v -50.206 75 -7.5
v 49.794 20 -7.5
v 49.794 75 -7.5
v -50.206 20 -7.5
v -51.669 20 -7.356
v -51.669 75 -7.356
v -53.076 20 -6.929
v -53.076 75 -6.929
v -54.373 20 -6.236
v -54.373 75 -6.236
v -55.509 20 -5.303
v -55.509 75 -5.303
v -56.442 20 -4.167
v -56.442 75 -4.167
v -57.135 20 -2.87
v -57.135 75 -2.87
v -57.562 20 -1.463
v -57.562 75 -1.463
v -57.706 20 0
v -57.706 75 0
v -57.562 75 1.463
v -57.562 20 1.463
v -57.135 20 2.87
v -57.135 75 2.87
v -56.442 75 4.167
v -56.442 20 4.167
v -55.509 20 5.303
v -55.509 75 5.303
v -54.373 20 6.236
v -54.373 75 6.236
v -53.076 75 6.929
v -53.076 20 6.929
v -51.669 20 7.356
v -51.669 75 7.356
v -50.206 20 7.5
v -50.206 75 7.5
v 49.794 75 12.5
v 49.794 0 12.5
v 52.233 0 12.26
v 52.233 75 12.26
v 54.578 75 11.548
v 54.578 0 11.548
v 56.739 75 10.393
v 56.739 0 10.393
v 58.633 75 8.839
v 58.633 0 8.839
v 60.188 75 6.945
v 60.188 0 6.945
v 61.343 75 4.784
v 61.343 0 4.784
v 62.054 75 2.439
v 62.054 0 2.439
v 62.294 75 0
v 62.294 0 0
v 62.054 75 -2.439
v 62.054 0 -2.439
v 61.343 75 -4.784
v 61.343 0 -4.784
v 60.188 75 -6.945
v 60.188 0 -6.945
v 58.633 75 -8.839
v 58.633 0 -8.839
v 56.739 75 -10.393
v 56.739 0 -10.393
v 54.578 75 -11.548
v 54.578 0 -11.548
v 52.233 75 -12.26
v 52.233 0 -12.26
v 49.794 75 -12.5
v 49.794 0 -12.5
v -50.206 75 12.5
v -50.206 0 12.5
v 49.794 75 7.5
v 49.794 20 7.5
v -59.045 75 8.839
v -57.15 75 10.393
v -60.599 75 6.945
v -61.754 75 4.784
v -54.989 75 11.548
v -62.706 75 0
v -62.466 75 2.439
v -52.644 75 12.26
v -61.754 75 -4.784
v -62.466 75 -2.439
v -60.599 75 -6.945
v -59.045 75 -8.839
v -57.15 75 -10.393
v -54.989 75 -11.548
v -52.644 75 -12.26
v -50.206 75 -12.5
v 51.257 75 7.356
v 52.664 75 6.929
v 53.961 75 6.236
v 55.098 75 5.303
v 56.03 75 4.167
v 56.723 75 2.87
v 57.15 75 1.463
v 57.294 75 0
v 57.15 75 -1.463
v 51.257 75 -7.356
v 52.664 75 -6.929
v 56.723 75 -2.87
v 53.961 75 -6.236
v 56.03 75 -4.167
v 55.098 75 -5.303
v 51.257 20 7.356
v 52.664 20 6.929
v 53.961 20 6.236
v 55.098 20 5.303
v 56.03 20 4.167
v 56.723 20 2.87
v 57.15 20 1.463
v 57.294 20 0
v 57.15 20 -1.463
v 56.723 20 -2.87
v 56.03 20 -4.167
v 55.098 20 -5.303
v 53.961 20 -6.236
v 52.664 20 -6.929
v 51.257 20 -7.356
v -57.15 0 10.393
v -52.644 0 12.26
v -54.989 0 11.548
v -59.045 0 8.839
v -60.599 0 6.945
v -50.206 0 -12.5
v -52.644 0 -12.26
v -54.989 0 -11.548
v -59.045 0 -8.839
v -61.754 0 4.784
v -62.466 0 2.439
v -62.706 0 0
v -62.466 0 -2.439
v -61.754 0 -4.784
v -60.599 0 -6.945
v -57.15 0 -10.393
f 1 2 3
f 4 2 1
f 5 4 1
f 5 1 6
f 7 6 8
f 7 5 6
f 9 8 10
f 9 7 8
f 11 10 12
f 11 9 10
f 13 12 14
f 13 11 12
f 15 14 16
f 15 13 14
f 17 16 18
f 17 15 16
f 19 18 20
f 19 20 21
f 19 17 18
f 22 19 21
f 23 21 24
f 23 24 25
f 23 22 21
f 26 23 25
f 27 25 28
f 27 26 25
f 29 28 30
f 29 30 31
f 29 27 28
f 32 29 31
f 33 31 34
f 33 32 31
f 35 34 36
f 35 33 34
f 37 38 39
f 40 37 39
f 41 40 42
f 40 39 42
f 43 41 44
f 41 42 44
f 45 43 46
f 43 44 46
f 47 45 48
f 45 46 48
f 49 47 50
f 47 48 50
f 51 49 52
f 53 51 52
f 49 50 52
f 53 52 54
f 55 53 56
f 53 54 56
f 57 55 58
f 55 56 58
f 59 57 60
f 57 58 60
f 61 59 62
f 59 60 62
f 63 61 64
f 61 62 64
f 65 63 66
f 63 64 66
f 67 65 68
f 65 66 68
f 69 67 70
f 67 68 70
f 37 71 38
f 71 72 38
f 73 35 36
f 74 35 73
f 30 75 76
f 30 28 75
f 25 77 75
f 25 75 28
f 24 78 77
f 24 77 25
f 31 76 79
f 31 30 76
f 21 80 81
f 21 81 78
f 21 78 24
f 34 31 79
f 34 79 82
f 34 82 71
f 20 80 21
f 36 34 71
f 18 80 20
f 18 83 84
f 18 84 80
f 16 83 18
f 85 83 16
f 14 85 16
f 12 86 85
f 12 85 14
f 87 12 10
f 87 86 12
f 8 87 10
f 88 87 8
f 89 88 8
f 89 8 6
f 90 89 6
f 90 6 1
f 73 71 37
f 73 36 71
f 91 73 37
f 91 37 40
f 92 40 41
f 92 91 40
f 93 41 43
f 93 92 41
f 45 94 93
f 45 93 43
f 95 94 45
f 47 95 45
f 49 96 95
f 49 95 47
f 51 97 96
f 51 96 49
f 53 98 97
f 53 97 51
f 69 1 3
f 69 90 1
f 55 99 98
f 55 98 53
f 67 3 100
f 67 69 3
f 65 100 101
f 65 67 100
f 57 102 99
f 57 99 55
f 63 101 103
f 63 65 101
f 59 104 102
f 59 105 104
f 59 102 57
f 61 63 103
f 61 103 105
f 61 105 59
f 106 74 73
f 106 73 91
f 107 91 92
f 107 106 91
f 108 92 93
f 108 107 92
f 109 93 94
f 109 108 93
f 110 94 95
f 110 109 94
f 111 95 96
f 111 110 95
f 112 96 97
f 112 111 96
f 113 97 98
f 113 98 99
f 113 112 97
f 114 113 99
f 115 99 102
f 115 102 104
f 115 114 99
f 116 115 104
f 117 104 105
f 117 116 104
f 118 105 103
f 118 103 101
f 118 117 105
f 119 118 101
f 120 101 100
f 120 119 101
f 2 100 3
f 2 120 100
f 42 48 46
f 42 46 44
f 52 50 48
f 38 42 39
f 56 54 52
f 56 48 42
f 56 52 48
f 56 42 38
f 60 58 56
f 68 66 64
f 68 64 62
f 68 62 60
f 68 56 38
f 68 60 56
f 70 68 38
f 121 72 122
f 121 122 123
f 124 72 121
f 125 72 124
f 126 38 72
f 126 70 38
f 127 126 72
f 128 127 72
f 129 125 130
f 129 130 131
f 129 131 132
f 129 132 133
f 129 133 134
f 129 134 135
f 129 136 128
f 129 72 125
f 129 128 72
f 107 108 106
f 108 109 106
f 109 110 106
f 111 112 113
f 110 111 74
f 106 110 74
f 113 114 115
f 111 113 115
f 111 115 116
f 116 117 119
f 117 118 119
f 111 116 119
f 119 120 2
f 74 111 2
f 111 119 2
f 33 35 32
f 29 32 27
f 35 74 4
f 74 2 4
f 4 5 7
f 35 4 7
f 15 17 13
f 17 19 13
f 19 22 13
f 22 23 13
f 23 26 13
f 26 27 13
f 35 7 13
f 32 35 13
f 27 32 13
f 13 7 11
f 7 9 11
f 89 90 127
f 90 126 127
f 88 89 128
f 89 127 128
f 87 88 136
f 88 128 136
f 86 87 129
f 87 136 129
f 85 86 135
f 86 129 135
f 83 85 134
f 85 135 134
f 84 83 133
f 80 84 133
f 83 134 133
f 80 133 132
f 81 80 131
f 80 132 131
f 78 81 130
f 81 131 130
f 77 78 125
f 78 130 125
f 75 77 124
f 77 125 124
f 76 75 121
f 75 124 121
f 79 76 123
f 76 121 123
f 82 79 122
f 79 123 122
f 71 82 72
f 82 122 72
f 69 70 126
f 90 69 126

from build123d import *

# Parameters (mm, degrees)
EXTRUDE_1_DEPTH   = 20
EXTRUDE_1_2_DEPTH = 55


with BuildPart() as part:
    # 草图1 → Extrude 1 (new body)
    with BuildSketch(Plane(origin=(0, 0, 0), x_dir=(1, 0, 0), z_dir=(0, 1, 0))):
        with BuildLine():
            Line((-50.205761317, 12.5), (49.794238683, 12.5))
            ThreePointArc((49.794238683, 12.5), (62.294238683, 0), (49.794238683, -12.5))
            Line((49.794238683, -12.5), (-50.205761317, -12.5))
            ThreePointArc((-50.205761317, -12.5), (-62.705761317, 0), (-50.205761317, 12.5))
        make_face()
    extrude(amount=EXTRUDE_1_DEPTH)

    # 草图2 → Extrude 1 2 (add)
    with BuildSketch(Plane(origin=(0, 20, 0), x_dir=(1, 0, 0), z_dir=(0, 1, 0))):
        with BuildLine():
            Line((49.794238683, 12.5), (-50.205761317, 12.5))
            ThreePointArc((-50.205761317, 12.5), (-62.705761317, 0), (-50.205761317, -12.5))
            Line((-50.205761317, -12.5), (49.794238683, -12.5))
            ThreePointArc((49.794238683, -12.5), (62.294238683, 0), (49.794238683, 12.5))
        make_face()
        with BuildLine():
            Line((49.794238683, 7.5), (-50.205761317, 7.5))
            ThreePointArc((-50.205761317, 7.5), (-57.705761317, 0), (-50.205761317, -7.5))
            Line((-50.205761317, -7.5), (49.794238683, -7.5))
            ThreePointArc((49.794238683, -7.5), (57.294238683, 0), (49.794238683, 7.5))
        make_face(mode=Mode.SUBTRACT)
    extrude(amount=EXTRUDE_1_2_DEPTH)


solid = part.part
